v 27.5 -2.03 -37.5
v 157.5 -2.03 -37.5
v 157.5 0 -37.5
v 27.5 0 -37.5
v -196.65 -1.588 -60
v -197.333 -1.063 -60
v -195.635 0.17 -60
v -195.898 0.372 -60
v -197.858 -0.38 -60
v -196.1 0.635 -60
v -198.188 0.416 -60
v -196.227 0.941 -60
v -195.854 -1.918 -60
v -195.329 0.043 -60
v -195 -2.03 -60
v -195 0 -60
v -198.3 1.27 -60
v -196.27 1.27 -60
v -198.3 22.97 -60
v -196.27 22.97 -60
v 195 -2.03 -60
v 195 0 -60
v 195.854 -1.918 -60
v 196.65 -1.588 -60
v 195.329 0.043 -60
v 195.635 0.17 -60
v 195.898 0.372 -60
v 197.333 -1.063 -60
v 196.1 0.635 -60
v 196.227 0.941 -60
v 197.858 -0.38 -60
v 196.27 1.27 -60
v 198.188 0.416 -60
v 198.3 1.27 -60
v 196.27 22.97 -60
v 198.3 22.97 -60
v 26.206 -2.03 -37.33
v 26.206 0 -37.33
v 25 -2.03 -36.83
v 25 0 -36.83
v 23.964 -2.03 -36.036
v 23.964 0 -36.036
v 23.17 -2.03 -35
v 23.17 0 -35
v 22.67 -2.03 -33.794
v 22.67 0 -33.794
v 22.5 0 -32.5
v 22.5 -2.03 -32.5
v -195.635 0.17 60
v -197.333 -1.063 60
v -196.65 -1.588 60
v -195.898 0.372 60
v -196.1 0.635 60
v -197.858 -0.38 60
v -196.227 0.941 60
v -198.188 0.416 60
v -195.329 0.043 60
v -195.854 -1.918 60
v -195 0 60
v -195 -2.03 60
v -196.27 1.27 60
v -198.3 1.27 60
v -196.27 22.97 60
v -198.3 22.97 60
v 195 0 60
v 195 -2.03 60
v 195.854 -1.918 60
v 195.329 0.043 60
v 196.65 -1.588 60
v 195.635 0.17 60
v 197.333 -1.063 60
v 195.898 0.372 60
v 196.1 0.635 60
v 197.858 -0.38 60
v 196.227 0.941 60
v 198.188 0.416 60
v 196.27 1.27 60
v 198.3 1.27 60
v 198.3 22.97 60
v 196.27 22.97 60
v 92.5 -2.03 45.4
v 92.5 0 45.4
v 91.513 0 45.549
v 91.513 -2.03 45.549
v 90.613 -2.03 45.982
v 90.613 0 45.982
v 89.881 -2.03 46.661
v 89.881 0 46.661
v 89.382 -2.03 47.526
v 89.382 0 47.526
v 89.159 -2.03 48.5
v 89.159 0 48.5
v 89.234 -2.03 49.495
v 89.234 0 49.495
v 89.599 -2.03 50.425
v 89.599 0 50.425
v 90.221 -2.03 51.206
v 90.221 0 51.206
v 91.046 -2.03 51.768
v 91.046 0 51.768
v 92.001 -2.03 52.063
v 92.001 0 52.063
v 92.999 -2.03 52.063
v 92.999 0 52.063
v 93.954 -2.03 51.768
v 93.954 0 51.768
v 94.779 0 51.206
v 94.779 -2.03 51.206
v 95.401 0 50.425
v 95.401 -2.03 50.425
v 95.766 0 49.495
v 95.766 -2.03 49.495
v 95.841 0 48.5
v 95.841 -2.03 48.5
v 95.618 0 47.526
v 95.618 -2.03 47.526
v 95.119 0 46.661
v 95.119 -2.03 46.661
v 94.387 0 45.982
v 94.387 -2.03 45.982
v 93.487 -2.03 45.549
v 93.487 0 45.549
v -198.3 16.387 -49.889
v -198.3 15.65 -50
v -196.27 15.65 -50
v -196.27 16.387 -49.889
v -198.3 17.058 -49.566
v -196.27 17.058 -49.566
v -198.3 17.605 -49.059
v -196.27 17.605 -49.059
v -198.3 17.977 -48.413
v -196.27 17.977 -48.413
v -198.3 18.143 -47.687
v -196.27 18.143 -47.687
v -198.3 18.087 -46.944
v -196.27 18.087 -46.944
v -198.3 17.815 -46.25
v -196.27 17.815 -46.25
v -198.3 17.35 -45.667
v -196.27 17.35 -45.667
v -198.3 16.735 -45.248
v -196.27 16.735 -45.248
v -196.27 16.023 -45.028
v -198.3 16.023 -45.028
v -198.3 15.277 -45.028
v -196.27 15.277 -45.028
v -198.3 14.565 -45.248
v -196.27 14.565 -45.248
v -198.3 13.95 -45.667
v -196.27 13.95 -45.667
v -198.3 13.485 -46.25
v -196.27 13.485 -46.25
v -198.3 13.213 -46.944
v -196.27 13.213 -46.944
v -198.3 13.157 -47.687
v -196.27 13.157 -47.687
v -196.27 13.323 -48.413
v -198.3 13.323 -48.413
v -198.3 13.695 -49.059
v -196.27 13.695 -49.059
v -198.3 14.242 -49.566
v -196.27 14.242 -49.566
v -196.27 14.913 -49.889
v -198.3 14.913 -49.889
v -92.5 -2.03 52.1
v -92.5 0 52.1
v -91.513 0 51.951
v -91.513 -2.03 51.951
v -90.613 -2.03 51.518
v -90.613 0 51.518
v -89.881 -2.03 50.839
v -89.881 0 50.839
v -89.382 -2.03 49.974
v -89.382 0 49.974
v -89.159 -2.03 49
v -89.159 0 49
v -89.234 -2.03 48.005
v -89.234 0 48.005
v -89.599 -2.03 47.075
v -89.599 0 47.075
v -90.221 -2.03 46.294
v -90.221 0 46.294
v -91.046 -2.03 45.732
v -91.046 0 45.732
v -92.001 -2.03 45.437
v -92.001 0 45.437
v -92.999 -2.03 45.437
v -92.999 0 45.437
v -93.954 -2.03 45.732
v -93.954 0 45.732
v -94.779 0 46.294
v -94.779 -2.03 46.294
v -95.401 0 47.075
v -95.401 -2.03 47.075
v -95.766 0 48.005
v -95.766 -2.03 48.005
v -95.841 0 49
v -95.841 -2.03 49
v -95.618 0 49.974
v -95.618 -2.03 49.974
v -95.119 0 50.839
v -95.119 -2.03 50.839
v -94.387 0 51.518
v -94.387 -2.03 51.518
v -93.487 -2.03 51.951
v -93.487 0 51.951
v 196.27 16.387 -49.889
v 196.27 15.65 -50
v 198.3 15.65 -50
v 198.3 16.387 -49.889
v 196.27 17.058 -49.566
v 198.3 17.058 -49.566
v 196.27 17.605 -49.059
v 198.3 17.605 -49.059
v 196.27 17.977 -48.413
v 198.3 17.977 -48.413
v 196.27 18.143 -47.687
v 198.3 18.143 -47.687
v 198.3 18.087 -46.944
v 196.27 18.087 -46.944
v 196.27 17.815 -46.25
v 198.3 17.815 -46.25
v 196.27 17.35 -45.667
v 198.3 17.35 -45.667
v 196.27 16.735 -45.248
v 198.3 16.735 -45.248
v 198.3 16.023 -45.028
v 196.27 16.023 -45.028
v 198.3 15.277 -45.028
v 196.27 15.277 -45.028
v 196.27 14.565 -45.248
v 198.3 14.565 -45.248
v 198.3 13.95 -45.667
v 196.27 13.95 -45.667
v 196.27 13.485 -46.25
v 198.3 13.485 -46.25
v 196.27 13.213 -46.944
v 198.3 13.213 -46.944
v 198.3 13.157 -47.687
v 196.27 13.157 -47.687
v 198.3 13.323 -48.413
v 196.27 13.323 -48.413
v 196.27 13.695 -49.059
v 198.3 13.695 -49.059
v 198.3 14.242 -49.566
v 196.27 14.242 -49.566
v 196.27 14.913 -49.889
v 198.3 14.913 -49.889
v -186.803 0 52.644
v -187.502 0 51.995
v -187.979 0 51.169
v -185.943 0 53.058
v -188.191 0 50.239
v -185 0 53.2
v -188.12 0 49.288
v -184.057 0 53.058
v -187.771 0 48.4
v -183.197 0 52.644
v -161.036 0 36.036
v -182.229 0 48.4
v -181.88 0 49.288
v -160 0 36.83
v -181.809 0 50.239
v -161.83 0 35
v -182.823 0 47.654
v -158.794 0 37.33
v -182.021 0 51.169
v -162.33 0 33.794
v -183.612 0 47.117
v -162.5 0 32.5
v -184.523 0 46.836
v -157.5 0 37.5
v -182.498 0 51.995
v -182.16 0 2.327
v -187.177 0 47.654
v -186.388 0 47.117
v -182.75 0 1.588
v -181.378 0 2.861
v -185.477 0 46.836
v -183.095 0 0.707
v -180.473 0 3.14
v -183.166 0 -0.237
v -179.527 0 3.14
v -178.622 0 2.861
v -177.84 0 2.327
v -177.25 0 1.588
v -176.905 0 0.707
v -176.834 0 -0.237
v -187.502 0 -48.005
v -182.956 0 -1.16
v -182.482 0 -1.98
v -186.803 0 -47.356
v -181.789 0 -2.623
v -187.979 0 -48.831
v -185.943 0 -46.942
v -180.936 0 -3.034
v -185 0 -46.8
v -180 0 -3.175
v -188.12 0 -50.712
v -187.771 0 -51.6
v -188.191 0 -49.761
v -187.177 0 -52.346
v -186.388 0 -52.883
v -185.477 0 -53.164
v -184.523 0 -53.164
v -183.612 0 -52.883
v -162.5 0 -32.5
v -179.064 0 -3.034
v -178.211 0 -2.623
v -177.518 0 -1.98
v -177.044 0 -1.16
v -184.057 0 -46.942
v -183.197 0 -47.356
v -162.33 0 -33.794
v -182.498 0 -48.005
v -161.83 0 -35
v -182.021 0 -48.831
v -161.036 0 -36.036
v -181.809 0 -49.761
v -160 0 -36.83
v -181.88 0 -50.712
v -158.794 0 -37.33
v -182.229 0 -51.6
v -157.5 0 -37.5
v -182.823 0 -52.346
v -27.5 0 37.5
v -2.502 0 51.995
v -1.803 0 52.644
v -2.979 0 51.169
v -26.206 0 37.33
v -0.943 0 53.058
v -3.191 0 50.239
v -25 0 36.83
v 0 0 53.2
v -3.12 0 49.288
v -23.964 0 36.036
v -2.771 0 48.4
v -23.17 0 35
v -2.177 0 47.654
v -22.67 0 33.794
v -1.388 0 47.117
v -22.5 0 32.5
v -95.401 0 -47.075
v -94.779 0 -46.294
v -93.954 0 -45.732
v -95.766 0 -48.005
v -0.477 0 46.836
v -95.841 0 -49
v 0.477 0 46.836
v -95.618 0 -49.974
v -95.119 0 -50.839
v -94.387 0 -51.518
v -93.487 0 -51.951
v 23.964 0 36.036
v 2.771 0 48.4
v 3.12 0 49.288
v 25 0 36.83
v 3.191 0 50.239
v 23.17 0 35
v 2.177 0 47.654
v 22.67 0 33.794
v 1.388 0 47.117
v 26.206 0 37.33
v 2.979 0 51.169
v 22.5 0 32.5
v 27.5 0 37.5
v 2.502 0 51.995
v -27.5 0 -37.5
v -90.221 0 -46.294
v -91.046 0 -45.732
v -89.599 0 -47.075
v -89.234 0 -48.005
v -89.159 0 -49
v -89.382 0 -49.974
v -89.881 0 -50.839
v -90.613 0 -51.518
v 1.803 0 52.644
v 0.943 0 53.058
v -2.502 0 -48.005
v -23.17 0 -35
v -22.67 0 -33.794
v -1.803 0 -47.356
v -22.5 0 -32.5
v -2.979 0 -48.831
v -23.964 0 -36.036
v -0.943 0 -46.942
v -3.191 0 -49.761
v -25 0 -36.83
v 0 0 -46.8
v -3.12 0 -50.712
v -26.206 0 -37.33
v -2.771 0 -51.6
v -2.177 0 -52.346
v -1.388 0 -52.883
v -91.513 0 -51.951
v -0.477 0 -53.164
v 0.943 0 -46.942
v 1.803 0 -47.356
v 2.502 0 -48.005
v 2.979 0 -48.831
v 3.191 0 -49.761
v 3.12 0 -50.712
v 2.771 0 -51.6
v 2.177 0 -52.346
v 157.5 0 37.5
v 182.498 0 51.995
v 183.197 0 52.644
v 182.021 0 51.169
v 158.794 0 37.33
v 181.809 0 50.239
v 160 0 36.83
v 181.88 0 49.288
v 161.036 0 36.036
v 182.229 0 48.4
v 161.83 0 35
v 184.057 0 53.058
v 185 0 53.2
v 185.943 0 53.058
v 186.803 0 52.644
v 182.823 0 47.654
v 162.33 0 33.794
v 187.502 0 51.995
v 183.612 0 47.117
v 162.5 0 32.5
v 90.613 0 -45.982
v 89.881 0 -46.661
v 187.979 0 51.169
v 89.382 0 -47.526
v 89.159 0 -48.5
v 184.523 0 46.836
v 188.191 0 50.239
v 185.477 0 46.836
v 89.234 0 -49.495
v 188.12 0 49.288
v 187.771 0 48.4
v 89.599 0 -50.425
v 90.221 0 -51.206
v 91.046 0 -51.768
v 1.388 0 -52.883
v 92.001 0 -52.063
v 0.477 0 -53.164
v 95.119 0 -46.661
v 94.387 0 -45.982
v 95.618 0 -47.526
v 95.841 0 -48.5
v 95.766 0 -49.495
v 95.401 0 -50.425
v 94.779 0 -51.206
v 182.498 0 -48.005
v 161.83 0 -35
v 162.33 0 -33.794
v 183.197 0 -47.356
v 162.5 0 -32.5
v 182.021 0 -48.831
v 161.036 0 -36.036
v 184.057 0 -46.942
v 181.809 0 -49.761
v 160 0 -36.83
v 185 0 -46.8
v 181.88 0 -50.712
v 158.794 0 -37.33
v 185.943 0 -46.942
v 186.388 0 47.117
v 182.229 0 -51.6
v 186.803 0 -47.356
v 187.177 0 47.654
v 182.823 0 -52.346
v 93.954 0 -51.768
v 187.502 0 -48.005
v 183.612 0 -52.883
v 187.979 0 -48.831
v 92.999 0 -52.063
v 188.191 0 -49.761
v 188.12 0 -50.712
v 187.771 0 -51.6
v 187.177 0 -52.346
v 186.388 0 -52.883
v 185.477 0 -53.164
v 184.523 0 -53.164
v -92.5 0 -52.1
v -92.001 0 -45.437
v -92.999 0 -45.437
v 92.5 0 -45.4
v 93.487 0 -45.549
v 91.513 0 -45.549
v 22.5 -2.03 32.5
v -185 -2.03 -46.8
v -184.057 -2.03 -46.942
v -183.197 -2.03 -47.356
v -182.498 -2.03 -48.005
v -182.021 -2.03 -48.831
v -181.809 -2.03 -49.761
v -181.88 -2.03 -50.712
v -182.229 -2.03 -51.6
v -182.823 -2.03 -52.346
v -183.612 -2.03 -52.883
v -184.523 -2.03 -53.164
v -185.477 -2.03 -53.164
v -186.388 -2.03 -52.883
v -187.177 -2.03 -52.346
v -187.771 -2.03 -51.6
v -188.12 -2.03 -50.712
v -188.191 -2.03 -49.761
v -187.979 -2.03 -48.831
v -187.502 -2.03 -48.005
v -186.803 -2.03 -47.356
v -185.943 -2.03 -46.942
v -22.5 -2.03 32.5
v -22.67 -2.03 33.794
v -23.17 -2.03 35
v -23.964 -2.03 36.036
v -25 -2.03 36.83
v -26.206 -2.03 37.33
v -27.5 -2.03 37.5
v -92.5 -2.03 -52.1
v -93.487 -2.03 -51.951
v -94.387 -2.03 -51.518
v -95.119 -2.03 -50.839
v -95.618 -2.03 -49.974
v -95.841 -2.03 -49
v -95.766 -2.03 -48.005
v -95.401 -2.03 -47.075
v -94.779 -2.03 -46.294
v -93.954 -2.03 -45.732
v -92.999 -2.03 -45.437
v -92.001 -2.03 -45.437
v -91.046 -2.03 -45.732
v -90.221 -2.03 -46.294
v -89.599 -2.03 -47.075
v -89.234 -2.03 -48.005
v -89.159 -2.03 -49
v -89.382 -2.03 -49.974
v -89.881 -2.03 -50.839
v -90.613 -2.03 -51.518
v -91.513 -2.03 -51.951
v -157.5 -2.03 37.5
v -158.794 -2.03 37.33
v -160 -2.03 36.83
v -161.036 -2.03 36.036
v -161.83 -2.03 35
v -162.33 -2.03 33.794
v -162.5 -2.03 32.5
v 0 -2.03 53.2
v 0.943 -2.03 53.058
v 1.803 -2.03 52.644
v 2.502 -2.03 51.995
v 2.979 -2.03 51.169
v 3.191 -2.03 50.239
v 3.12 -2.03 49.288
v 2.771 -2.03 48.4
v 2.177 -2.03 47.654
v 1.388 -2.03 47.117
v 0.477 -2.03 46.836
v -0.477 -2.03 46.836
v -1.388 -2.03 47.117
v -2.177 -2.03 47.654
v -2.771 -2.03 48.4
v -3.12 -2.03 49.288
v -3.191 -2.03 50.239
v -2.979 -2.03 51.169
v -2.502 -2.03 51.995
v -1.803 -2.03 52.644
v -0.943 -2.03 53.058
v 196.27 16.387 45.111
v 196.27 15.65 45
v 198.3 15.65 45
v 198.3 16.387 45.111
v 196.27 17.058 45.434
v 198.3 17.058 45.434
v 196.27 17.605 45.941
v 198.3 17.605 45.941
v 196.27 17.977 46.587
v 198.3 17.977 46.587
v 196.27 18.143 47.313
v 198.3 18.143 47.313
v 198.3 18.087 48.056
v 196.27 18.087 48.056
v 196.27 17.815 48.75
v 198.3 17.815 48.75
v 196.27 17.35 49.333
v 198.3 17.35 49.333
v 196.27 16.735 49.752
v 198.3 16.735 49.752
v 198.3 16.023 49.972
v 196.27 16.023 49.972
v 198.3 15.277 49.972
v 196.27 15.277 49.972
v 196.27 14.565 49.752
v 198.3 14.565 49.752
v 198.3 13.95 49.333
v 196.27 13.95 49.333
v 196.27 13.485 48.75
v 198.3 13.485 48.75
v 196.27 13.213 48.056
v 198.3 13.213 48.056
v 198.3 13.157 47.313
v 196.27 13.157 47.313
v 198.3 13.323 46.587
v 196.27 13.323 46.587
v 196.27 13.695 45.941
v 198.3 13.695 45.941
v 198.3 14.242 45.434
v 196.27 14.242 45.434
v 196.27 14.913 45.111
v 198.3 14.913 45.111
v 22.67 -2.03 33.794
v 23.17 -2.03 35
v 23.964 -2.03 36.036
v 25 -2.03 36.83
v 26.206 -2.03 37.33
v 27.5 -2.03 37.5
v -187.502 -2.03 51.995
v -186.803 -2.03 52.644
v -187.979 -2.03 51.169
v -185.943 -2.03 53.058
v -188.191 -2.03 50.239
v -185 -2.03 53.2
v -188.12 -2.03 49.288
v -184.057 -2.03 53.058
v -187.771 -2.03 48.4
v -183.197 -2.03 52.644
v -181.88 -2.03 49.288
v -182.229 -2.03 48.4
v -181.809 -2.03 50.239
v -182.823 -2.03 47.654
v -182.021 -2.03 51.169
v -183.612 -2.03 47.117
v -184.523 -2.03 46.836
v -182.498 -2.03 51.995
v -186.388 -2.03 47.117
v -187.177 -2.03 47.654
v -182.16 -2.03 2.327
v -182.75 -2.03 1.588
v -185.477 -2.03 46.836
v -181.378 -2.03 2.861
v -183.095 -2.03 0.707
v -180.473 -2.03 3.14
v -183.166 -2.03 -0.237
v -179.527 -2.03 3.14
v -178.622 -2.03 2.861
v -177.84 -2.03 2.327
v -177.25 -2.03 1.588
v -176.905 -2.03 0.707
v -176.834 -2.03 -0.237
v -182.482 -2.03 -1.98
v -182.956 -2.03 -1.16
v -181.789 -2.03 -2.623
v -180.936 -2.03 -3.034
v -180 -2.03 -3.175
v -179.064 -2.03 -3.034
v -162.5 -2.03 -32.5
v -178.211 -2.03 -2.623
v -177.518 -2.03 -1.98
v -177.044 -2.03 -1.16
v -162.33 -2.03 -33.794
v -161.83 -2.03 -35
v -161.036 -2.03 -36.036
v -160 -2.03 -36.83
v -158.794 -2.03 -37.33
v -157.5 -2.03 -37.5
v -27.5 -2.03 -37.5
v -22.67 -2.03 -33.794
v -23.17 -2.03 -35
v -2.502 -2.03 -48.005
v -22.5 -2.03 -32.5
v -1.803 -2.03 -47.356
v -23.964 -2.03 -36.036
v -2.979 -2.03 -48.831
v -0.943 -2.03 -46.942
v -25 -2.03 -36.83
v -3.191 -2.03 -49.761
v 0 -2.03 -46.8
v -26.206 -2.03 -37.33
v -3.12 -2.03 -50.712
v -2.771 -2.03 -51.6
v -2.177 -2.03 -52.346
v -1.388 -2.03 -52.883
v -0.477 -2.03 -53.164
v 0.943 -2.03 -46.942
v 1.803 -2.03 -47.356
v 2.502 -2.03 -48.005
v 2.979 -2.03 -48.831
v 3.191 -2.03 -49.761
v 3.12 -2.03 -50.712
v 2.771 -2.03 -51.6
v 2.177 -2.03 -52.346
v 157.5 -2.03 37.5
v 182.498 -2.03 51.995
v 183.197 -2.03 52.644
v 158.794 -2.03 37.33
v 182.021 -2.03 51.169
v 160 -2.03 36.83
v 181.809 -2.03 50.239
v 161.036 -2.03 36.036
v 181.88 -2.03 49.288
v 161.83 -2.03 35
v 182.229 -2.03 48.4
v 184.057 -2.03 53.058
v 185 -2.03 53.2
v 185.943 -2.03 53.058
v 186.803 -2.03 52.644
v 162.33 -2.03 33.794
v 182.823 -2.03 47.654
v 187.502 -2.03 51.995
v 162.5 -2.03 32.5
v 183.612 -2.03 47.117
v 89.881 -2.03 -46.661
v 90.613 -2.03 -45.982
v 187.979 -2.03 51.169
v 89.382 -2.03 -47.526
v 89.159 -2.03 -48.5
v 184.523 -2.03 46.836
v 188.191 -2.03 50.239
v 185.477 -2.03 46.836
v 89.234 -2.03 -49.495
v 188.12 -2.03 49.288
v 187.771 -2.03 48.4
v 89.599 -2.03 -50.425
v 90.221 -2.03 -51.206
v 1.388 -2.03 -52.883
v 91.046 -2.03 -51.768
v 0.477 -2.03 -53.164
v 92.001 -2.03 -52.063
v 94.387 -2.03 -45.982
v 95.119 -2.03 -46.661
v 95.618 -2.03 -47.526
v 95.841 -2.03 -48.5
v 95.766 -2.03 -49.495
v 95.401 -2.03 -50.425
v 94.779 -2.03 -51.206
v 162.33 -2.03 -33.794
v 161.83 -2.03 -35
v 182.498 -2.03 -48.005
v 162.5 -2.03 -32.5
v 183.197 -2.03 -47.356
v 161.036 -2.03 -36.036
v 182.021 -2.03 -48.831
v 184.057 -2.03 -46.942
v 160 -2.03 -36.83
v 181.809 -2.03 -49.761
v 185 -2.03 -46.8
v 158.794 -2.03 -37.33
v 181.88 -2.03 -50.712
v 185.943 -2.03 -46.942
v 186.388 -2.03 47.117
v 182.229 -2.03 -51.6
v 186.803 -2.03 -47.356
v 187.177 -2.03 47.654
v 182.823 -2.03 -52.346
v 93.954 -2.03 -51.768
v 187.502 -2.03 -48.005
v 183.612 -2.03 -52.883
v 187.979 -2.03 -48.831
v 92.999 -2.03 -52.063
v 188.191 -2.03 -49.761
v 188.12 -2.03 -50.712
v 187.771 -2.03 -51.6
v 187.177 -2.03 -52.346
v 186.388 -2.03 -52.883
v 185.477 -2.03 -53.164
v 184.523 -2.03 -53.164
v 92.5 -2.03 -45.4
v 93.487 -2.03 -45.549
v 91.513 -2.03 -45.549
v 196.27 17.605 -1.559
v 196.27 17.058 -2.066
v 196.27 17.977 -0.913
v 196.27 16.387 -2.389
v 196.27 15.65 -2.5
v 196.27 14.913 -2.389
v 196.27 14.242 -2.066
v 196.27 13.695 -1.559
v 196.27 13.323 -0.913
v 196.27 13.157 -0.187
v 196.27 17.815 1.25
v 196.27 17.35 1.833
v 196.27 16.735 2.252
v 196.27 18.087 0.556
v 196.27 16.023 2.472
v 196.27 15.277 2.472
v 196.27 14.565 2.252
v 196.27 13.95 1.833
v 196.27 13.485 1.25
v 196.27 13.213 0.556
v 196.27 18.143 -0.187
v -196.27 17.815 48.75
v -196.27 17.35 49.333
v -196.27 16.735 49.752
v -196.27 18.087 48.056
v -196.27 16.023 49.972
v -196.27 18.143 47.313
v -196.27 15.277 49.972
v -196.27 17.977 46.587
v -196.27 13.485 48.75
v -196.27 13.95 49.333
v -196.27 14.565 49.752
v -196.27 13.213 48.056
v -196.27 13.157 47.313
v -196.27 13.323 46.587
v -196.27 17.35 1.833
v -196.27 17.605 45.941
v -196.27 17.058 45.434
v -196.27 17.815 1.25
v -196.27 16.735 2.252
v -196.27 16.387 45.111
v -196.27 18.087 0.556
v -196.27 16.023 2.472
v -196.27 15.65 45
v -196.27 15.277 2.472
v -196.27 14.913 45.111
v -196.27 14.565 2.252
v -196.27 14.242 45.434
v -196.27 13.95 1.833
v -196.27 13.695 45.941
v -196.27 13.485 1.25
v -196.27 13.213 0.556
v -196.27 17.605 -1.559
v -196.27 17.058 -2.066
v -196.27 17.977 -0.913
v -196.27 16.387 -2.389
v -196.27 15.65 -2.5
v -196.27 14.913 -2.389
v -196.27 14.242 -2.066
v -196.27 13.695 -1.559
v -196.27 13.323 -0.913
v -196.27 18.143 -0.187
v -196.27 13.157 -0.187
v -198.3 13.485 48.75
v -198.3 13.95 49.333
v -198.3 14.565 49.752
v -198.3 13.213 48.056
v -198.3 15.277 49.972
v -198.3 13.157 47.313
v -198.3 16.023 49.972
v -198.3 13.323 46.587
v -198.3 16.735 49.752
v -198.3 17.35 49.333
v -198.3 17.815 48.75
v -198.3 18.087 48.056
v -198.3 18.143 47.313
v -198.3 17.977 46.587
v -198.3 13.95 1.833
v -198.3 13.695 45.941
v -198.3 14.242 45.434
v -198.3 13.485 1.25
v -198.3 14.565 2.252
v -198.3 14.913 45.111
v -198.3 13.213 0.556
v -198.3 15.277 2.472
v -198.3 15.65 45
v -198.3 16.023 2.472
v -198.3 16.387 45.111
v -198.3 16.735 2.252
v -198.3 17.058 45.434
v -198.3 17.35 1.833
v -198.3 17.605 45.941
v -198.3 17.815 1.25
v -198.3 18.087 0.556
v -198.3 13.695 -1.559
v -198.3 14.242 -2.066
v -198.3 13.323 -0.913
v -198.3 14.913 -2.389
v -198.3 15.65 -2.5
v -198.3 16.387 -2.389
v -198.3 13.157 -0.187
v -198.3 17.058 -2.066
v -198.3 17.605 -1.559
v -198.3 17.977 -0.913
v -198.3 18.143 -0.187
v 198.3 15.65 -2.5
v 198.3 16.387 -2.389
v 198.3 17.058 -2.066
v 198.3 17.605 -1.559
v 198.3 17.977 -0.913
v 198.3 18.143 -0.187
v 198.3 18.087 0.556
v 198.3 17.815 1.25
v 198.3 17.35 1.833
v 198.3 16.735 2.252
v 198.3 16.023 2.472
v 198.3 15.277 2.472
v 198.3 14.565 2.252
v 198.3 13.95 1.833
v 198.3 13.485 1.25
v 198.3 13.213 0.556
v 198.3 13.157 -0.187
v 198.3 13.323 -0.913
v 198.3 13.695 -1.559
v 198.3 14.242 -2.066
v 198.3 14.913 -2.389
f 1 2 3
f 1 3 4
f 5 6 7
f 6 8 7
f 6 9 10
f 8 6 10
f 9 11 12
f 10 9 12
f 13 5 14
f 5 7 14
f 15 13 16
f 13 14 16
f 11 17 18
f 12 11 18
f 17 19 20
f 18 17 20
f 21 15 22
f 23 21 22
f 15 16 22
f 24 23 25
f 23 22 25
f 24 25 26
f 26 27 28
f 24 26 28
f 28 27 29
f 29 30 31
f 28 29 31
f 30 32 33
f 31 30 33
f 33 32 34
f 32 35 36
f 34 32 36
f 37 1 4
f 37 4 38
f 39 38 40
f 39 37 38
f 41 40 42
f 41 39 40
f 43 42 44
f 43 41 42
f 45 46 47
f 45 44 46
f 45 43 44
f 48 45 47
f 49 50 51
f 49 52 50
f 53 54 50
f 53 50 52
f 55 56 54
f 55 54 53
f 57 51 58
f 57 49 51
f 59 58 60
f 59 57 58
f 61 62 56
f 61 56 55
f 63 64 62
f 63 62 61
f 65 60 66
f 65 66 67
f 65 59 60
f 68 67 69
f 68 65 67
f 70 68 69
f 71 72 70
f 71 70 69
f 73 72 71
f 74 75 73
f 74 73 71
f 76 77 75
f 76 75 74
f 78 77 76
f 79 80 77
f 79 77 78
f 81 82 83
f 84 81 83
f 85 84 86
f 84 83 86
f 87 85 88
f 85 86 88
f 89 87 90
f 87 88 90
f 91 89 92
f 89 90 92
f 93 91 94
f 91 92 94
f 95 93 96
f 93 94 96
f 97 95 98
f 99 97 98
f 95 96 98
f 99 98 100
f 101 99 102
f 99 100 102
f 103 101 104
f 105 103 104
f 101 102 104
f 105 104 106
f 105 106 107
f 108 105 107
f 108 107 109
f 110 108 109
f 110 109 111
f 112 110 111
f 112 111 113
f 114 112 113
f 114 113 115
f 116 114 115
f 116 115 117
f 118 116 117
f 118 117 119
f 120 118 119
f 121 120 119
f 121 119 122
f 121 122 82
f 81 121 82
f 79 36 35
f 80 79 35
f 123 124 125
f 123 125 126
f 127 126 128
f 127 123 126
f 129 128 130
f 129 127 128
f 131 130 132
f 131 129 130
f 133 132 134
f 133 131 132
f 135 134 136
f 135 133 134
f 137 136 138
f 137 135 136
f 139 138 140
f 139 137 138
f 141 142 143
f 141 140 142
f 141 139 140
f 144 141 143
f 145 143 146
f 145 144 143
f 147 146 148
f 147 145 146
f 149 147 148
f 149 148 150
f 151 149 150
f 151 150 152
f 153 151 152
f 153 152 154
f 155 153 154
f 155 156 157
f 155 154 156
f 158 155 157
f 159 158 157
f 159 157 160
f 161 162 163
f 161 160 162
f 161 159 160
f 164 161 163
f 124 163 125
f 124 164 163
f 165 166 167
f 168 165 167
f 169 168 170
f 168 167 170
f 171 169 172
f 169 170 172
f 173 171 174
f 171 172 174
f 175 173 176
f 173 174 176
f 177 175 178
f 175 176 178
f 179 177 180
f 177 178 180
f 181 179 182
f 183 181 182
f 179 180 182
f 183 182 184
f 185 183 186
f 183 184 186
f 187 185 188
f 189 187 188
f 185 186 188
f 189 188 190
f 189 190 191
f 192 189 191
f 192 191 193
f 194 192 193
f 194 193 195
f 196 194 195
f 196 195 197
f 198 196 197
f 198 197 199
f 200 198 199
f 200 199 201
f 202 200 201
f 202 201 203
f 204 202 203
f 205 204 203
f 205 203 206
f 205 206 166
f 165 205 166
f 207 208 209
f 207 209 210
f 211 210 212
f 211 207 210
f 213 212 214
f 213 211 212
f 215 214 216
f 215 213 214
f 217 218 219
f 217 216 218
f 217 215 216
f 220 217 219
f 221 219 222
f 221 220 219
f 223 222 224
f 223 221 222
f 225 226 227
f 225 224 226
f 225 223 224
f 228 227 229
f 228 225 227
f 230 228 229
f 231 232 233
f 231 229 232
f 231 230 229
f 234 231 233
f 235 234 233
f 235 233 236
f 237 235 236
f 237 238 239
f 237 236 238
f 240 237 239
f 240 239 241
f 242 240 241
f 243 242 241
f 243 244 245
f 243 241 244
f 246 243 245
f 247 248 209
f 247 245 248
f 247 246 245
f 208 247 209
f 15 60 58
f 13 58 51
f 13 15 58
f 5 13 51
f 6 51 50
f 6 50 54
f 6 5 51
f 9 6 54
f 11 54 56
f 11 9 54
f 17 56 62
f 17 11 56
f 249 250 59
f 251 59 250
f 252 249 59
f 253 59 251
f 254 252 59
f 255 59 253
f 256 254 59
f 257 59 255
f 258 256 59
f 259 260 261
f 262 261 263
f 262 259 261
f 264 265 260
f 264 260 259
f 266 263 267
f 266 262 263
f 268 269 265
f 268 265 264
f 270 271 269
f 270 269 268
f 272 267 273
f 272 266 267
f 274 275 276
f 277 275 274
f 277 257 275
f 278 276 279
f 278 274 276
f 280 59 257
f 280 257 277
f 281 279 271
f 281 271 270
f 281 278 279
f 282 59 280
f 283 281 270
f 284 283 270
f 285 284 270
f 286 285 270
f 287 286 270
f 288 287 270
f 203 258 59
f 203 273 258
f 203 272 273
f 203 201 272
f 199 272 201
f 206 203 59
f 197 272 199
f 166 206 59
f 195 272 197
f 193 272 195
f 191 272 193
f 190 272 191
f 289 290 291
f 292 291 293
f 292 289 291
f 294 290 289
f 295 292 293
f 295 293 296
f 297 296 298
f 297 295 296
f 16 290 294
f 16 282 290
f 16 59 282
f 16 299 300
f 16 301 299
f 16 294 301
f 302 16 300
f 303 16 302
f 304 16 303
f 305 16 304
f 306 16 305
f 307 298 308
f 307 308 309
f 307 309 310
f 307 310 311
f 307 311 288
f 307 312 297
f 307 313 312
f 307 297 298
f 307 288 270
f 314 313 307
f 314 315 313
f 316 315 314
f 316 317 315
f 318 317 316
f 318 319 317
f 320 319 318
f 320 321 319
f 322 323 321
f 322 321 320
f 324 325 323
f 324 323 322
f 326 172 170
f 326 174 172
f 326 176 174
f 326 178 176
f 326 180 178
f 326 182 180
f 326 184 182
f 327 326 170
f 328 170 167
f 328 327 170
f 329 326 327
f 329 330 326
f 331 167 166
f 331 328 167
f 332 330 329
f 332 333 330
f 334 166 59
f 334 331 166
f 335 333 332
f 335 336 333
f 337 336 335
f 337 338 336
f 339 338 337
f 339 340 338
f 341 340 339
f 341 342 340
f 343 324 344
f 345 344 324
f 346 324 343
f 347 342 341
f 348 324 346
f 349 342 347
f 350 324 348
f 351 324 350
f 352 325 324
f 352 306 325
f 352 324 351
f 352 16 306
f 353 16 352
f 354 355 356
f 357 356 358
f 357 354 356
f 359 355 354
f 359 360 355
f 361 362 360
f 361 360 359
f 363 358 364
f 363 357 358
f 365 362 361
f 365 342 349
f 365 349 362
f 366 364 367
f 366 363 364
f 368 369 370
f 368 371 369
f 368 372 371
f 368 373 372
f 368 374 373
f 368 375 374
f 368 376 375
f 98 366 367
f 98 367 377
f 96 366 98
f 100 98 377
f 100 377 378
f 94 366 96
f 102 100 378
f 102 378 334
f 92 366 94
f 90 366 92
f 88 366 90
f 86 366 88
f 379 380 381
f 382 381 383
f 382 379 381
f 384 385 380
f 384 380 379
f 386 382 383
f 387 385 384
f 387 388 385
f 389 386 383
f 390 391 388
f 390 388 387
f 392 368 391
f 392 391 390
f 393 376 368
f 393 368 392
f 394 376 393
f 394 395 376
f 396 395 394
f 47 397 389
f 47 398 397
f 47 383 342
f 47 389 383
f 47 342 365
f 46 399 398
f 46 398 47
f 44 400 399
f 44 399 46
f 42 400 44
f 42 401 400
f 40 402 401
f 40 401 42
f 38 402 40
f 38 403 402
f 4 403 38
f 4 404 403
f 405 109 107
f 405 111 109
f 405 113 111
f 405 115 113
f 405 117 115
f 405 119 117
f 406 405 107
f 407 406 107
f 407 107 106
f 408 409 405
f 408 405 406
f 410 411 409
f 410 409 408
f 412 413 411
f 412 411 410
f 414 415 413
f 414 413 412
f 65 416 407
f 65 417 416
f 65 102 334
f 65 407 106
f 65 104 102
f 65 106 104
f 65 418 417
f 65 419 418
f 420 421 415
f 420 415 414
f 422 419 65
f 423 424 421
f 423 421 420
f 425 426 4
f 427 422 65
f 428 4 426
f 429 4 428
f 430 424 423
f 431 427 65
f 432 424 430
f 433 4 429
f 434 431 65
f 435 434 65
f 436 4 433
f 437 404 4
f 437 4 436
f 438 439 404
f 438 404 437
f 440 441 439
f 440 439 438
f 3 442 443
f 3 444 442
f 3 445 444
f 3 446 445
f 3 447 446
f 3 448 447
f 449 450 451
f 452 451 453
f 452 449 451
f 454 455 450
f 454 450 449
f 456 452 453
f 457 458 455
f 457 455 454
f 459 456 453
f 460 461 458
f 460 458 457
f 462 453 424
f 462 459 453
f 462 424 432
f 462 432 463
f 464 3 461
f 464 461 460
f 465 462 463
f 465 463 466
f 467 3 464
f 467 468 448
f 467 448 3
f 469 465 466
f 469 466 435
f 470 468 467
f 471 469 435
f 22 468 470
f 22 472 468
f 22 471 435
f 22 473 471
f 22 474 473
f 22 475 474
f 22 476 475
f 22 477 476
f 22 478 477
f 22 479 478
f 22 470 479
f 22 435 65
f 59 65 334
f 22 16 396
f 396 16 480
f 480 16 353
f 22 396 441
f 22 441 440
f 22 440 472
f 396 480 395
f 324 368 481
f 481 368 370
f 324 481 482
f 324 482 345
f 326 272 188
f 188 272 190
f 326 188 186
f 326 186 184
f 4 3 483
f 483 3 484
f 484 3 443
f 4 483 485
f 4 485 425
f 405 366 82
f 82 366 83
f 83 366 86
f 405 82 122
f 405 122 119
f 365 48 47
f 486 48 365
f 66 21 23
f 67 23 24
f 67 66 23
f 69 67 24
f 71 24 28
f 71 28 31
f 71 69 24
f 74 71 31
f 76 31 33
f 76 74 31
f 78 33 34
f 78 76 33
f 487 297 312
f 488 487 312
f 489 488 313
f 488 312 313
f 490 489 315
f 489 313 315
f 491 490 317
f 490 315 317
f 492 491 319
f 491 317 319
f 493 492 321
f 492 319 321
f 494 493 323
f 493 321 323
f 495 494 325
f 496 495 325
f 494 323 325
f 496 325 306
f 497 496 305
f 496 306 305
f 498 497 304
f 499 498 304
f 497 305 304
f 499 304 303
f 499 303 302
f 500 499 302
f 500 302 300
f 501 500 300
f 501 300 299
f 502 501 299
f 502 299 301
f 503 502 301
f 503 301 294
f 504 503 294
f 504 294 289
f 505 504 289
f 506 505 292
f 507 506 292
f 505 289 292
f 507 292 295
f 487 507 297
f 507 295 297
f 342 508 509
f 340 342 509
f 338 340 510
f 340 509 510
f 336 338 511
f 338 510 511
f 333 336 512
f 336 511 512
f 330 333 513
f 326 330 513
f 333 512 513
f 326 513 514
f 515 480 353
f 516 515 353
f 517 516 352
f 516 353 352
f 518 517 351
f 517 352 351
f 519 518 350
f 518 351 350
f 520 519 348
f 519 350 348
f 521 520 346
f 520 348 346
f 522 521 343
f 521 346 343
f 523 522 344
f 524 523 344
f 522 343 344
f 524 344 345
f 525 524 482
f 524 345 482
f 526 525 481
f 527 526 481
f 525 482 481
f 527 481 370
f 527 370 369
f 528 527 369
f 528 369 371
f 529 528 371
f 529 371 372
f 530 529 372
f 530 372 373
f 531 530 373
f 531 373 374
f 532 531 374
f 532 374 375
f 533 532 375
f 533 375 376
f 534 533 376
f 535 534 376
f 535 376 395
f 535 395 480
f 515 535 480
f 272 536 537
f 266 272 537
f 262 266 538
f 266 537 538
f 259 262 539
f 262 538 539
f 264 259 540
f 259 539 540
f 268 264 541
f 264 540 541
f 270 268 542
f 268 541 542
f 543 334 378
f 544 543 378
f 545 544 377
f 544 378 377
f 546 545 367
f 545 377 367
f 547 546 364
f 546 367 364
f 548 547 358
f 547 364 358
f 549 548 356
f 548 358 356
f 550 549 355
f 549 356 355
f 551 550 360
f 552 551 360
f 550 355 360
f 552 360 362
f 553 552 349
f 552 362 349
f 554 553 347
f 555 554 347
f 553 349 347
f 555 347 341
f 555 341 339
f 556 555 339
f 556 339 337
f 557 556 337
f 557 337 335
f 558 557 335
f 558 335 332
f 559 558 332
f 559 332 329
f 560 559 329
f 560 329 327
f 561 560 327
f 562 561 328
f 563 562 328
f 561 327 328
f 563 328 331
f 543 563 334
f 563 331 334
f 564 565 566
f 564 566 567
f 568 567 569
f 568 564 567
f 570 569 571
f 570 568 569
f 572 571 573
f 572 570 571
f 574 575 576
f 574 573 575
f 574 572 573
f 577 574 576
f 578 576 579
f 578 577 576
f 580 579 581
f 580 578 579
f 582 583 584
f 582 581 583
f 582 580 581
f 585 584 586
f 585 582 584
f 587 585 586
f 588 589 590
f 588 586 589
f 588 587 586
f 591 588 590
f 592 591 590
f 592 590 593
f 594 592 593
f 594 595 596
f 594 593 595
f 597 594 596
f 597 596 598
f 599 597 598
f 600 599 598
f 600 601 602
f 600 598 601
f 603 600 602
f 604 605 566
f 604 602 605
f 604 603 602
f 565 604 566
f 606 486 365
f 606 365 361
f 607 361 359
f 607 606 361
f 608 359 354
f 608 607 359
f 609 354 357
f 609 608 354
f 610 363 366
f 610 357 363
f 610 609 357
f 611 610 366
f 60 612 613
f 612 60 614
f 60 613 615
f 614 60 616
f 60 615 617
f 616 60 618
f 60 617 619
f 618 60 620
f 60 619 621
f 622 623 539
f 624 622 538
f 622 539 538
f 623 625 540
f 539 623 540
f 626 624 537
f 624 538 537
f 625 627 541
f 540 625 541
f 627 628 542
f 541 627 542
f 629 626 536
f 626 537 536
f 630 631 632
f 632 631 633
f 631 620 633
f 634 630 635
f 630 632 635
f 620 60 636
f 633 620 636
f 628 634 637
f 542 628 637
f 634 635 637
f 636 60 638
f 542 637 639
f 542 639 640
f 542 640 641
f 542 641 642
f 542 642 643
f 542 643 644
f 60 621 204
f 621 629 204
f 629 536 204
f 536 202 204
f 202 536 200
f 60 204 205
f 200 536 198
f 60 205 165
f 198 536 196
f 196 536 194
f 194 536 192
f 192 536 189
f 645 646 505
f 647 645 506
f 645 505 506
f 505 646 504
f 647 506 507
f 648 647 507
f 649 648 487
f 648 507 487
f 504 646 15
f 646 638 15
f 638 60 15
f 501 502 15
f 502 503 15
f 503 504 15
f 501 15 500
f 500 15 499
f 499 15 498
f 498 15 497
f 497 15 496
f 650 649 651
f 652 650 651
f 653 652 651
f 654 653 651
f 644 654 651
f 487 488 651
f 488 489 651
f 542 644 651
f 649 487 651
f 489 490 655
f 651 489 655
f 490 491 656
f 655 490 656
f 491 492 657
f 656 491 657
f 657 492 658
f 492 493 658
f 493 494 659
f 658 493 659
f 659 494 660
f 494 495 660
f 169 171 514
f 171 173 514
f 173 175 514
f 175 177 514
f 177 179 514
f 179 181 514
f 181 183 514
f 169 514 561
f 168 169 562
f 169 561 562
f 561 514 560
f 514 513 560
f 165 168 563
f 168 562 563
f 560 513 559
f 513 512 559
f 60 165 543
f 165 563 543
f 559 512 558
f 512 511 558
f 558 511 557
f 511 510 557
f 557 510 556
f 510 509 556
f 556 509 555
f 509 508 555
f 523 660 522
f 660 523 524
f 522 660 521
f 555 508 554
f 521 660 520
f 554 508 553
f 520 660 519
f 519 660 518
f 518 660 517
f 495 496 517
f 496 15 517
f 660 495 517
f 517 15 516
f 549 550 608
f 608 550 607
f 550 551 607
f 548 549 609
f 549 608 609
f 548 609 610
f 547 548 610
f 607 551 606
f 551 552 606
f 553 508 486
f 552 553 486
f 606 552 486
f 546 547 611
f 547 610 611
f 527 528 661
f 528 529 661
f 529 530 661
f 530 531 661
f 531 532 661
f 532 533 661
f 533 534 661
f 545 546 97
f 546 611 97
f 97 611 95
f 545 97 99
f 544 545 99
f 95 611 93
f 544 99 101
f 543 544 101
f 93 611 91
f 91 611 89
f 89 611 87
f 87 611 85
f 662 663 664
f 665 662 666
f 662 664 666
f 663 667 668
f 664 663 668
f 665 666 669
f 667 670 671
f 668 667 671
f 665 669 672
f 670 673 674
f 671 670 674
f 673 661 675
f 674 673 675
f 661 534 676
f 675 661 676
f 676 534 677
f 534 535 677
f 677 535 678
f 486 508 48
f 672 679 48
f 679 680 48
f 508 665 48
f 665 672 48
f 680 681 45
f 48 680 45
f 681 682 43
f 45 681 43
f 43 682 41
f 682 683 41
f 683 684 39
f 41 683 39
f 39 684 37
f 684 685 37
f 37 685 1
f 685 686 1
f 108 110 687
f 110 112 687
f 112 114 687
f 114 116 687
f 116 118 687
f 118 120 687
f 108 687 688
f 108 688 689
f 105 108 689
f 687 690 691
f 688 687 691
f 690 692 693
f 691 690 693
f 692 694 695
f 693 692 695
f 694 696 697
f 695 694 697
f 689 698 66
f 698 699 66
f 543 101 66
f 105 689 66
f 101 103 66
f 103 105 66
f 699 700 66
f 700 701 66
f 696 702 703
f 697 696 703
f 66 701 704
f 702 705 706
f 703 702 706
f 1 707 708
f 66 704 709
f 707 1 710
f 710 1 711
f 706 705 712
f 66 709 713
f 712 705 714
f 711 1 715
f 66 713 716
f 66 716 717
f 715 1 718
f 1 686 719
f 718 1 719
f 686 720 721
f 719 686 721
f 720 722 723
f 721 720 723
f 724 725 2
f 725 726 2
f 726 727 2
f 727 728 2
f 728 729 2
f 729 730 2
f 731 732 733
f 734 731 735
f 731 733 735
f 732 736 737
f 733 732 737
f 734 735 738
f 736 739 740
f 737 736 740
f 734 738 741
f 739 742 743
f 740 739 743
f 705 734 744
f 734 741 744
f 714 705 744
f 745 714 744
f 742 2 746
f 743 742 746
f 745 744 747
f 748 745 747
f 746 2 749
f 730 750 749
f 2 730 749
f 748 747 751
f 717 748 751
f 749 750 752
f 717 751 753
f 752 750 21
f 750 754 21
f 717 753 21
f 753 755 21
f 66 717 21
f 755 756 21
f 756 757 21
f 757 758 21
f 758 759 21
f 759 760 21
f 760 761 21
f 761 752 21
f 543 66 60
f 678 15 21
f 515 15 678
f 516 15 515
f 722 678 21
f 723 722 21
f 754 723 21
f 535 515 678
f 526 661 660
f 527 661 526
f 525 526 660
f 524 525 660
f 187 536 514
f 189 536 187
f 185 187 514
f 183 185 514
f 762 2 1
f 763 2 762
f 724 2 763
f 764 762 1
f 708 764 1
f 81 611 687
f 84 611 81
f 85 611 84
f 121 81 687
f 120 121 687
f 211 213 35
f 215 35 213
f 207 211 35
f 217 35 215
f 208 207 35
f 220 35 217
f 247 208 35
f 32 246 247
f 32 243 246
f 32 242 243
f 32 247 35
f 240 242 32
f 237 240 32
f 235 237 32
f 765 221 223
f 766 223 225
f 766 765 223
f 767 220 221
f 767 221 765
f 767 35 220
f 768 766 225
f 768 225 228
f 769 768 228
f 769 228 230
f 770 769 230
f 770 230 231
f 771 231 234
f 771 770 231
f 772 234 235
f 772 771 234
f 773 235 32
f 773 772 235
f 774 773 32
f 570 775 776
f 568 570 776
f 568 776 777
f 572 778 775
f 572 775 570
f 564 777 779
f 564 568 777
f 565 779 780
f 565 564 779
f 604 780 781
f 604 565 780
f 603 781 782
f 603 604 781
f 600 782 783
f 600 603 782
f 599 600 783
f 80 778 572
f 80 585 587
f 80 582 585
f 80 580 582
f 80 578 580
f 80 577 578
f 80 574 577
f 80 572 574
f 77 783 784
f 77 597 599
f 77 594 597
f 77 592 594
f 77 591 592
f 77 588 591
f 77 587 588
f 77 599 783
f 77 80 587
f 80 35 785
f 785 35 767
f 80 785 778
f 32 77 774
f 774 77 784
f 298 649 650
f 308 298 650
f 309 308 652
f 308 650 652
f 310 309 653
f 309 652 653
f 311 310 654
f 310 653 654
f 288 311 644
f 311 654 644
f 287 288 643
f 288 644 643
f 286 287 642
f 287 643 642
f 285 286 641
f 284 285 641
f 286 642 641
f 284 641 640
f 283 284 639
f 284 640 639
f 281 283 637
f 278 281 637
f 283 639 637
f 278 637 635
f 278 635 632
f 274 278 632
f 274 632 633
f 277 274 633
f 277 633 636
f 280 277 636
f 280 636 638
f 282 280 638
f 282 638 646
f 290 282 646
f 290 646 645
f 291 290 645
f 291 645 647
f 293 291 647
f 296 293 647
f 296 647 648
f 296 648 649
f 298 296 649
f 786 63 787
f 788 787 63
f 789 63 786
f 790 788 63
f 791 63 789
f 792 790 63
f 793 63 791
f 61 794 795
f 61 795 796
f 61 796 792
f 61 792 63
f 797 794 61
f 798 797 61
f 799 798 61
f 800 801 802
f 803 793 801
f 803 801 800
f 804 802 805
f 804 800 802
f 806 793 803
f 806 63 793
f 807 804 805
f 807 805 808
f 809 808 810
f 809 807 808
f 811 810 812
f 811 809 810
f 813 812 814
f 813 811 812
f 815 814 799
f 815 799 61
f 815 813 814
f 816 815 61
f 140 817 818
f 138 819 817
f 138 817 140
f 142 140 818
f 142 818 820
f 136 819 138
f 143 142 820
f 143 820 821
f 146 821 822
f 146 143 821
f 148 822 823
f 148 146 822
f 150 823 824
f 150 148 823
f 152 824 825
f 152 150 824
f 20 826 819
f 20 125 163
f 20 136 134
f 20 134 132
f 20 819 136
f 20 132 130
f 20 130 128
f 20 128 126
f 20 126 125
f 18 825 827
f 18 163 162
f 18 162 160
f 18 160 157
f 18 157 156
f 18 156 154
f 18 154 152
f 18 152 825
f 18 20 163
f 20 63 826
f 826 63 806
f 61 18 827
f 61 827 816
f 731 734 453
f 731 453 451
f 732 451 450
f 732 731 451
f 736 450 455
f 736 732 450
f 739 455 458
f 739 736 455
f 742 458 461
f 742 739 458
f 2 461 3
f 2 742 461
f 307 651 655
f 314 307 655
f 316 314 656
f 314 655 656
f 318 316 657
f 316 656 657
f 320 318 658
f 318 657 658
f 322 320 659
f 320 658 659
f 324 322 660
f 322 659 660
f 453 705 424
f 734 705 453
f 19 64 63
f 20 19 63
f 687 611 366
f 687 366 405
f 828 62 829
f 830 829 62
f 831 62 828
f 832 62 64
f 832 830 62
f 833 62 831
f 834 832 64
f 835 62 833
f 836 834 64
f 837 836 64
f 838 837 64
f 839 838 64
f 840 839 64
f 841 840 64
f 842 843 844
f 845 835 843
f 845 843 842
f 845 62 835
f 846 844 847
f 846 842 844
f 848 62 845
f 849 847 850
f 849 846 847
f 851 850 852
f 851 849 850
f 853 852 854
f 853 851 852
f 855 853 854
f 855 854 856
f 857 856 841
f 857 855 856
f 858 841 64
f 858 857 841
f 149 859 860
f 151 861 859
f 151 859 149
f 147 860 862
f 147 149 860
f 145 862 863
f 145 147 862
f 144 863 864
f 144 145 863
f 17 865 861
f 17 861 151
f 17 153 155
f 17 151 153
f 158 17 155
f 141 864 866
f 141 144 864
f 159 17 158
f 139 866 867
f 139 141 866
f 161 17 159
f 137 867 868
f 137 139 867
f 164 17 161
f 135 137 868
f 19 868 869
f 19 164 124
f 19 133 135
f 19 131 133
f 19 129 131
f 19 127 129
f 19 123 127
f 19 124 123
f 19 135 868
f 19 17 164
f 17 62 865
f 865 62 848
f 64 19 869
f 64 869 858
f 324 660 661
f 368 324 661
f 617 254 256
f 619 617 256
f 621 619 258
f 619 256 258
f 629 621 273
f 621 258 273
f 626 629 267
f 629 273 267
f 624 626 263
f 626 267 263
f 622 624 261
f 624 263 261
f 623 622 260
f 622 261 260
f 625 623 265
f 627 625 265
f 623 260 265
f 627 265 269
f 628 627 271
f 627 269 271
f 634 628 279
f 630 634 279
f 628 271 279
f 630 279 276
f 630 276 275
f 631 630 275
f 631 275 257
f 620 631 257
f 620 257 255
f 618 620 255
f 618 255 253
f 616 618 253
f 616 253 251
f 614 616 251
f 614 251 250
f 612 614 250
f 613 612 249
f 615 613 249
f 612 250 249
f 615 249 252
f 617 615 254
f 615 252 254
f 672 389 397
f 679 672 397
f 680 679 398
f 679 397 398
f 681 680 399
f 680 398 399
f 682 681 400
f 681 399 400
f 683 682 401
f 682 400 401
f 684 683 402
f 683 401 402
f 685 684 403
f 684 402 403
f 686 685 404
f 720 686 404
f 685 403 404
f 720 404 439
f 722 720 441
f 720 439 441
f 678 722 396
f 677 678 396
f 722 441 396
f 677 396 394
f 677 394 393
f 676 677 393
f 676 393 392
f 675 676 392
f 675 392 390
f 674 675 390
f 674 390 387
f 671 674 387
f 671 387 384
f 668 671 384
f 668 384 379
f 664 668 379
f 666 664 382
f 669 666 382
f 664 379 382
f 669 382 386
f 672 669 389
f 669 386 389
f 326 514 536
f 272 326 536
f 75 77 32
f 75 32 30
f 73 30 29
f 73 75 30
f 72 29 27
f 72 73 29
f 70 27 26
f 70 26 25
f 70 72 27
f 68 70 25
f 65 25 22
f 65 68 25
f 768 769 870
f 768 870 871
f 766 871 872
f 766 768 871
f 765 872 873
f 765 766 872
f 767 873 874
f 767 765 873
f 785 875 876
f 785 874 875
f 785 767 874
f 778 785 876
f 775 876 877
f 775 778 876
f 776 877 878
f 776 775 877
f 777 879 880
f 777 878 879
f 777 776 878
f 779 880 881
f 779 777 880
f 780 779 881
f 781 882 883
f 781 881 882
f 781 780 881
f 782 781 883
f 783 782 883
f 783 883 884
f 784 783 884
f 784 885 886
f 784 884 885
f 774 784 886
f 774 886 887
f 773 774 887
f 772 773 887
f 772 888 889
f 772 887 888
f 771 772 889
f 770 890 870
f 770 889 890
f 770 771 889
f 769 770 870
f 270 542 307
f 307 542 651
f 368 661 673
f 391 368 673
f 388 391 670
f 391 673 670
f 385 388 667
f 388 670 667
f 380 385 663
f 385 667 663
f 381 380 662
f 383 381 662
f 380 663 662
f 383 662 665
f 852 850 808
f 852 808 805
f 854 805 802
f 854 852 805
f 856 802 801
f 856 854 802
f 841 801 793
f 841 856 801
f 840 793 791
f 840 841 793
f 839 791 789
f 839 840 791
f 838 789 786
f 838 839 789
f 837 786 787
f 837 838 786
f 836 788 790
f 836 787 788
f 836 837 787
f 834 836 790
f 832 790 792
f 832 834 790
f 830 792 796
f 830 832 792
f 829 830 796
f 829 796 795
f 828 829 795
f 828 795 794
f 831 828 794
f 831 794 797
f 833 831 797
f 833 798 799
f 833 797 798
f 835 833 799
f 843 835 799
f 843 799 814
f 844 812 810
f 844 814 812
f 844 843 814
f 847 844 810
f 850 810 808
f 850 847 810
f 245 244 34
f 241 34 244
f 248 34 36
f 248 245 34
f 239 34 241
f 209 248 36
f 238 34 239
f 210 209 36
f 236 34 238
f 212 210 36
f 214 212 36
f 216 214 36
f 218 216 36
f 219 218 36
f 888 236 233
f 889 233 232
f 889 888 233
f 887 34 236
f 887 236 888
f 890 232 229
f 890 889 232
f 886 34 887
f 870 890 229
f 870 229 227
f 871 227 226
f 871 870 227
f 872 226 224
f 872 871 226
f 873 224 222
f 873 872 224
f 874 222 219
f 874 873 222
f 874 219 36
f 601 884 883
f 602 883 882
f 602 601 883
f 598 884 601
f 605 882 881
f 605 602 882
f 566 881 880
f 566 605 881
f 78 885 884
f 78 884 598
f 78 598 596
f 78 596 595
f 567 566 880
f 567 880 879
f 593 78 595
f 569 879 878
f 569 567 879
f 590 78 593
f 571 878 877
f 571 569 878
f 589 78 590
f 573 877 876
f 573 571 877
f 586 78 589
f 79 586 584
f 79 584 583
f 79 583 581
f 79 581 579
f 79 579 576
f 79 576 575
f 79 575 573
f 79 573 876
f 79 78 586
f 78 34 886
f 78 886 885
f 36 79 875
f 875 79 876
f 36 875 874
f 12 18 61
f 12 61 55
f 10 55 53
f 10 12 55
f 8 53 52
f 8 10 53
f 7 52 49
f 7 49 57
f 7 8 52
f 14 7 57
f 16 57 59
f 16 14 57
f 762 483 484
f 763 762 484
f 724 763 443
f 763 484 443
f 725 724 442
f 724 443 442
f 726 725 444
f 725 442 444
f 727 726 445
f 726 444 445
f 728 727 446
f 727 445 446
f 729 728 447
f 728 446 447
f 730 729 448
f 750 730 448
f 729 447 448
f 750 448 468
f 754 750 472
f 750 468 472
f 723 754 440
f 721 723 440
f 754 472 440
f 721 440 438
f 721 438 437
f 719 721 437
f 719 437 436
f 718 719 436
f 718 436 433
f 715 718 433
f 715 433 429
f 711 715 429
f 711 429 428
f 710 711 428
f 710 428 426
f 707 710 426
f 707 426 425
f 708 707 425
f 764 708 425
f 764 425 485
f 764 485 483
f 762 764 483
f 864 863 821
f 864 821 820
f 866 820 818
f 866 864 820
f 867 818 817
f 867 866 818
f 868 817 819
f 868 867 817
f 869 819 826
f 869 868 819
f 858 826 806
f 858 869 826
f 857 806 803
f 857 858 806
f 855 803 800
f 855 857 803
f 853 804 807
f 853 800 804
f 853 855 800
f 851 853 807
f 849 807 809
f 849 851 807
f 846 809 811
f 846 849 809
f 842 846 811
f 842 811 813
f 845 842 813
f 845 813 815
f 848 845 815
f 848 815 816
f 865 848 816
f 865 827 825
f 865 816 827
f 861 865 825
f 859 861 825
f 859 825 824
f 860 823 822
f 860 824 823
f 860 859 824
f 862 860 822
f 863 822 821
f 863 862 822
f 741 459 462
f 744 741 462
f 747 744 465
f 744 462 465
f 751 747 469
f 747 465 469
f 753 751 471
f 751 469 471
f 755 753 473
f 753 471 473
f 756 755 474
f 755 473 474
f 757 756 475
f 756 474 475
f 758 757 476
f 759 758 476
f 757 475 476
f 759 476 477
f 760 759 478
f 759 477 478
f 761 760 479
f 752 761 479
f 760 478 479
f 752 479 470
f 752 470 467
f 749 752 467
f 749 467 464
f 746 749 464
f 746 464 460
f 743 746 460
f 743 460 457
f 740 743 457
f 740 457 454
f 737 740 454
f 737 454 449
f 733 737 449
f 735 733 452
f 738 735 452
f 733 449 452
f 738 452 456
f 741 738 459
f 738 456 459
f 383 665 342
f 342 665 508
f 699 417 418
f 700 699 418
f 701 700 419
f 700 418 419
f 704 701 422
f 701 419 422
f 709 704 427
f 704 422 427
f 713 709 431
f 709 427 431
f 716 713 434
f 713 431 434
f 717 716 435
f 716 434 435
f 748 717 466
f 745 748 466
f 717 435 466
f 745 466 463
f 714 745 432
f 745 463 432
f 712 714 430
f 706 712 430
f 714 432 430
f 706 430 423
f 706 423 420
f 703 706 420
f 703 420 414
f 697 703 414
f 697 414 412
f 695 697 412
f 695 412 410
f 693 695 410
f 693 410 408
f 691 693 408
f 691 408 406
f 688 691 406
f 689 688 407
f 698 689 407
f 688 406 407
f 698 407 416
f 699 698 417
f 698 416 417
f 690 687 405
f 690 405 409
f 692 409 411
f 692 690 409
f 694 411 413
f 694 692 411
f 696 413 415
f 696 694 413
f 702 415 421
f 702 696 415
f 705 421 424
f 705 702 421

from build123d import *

# Parameters (mm, degrees)
SKETCH1_W               = 390
SKETCH1_H               = 120
SKETCH1_R               = 3.2
BOSS_EXTRUDE1_DEPTH     = 2.03
EDGE_FLANGE1_DEPTH      = 120
EDGE_FLANGE1_BEND_DEPTH = 120
CUT_EXTRUDE1_REACH      = 210.681
CUT_EXTRUDE2_DEPTH      = 209.447861347
CUT_EXTRUDE2_DEPTH_BACK = 209.447861347
SKETCH19_R              = 2.5
SKETCH20_R              = 3.35
CUT_EXTRUDE3_DEPTH      = 209.447861347
SKETCH21_R              = 3.175
CUT_EXTRUDE4_DEPTH      = 209.681312053


# Sheet-metal steps are written as plain solids
with BuildPart() as part:
    # Sketch1 → Boss-Extrude1 (new body)
    with BuildSketch(Plane(origin=(0, 0, 0), x_dir=(1, 0, 0), z_dir=(0, 1, 0))):
        Rectangle(SKETCH1_W, SKETCH1_H)
        with Locations(Location((0, 50, 0), (0, 0, 270))):
            Circle(SKETCH1_R, mode=Mode.SUBTRACT)
        with Locations(Location((-185, 50, 0), (0, 0, 270))):
            Circle(SKETCH1_R, mode=Mode.SUBTRACT)
        with Locations(Location((-185, -50, 0), (0, 0, 270))):
            Circle(SKETCH1_R, mode=Mode.SUBTRACT)
        with Locations(Location((0, -50, 0), (0, 0, 270))):
            Circle(SKETCH1_R, mode=Mode.SUBTRACT)
        with Locations(Location((185, -50, 0), (0, 0, 270))):
            Circle(SKETCH1_R, mode=Mode.SUBTRACT)
        with Locations(Location((185, 50, 0), (0, 0, 270))):
            Circle(SKETCH1_R, mode=Mode.SUBTRACT)
    extrude(amount=-BOSS_EXTRUDE1_DEPTH)

    # Edge-Flange1 section (across the edge) → Edge-Flange1 (add)
    with BuildSketch(Plane(origin=(-196.27, 0, -60), x_dir=(1, 0, 0), z_dir=(0, 0, 1))):
        with BuildLine():
            Line((-2.03, 1.27), (-2.03, 22.97))
            Line((-2.03, 22.97), (0, 22.97))
            Line((0, 22.97), (0, 1.27))
            ThreePointArc((0, 1.27), (0.371974388, 0.371974388), (1.27, 0))
            Line((1.27, 0), (1.27, -2.03))
            ThreePointArc((1.27, -2.03), (-1.063452378, -1.063452378), (-2.03, 1.27))
        make_face()
    extrude(amount=EDGE_FLANGE1_DEPTH)

    # Edge-Flange1 section 2 (across the edge) → Edge-Flange1 bend (add)
    with BuildSketch(Plane(origin=(196.27, 0, 60), x_dir=(-1, 0, 0), z_dir=(0, 0, -1))):
        with BuildLine():
            Line((-2.03, 1.27), (-2.03, 22.97))
            Line((-2.03, 22.97), (0, 22.97))
            Line((0, 22.97), (0, 1.27))
            ThreePointArc((0, 1.27), (0.371974388, 0.371974388), (1.27, 0))
            Line((1.27, 0), (1.27, -2.03))
            ThreePointArc((1.27, -2.03), (-1.063452378, -1.063452378), (-2.03, 1.27))
        make_face()
    extrude(amount=EDGE_FLANGE1_BEND_DEPTH)

    # Sketch18 → Cut-Extrude1 (cut, up to next)
    with BuildSketch(Plane.XZ.offset(2.03), mode=Mode.PRIVATE) as cut_extrude1_sk1:
        with BuildLine():
            Line((-157.5, -37.5), (-27.5, -37.5))
            ThreePointArc((-27.5, -37.5), (-23.964466094, -36.035533906), (-22.5, -32.5))
            Line((-22.5, -32.5), (-22.5, 32.5))
            ThreePointArc((-22.5, 32.5), (-23.964466094, 36.035533906), (-27.5, 37.5))
            Line((-27.5, 37.5), (-157.5, 37.5))
            ThreePointArc((-157.5, 37.5), (-161.035533906, 36.035533906), (-162.5, 32.5))
            Line((-162.5, 32.5), (-162.5, -32.5))
            ThreePointArc((-162.5, -32.5), (-161.035533906, -36.035533906), (-157.5, -37.5))
        make_face()
    cut_extrude1_tool1 = extrude(cut_extrude1_sk1.sketch, amount=-CUT_EXTRUDE1_REACH, mode=Mode.PRIVATE) & part.part
    # Sketch18 → Cut-Extrude1 (cut, up to next)
    with BuildSketch(Plane.XZ.offset(2.03), mode=Mode.PRIVATE) as cut_extrude1_sk2:
        with BuildLine():
            Line((22.5, -32.5), (22.5, 32.5))
            ThreePointArc((22.5, 32.5), (23.964466094, 36.035533906), (27.5, 37.5))
            Line((27.5, 37.5), (157.5, 37.5))
            ThreePointArc((157.5, 37.5), (161.035533906, 36.035533906), (162.5, 32.5))
            Line((162.5, 32.5), (162.5, -32.5))
            ThreePointArc((162.5, -32.5), (161.035533906, -36.035533906), (157.5, -37.5))
            Line((157.5, -37.5), (27.5, -37.5))
            ThreePointArc((27.5, -37.5), (23.964466094, -36.035533906), (22.5, -32.5))
        make_face()
    cut_extrude1_tool2 = extrude(cut_extrude1_sk2.sketch, amount=-CUT_EXTRUDE1_REACH, mode=Mode.PRIVATE) & part.part
    add(cut_extrude1_tool1.solids().sort_by_distance((-92.5, -2.03, 0))[0], mode=Mode.SUBTRACT)
    add(cut_extrude1_tool2.solids().sort_by_distance((92.5, -2.03, 0))[0], mode=Mode.SUBTRACT)

    # Sketch19 → Cut-Extrude2 (cut, two sides: drawn at the far end of the back side and taken through both)
    with BuildSketch(Plane(origin=(0, 0, 0), x_dir=(0, 0, -1), z_dir=(1, 0, 0)).offset(-CUT_EXTRUDE2_DEPTH_BACK)):
        with Locations((-47.5, 15.65)):
            Circle(SKETCH19_R)
        with Locations((0, 15.65)):
            Circle(SKETCH19_R)
        with Locations((47.5, 15.65)):
            Circle(SKETCH19_R)
    extrude(amount=CUT_EXTRUDE2_DEPTH + CUT_EXTRUDE2_DEPTH_BACK, mode=Mode.SUBTRACT)

    # Sketch20 → Cut-Extrude3 (cut, through all)
    with BuildSketch(Plane(origin=(0, 0, 0), x_dir=(1, 0, 0), z_dir=(0, 1, 0))):
        with Locations(Location((-92.5, -48.75, 0), (0, 0, 270))):
            Circle(SKETCH20_R)
        with Locations(Location((92.5, -48.75, 0), (0, 0, 90))):
            Circle(SKETCH20_R)
        with Locations(Location((92.5, 48.75, 0), (0, 0, 270))):
            Circle(SKETCH20_R)
        with Locations(Location((-92.5, 48.75, 0), (0, 0, 90))):
            Circle(SKETCH20_R)
    extrude(amount=-CUT_EXTRUDE3_DEPTH, mode=Mode.SUBTRACT)

    # Sketch21 → Cut-Extrude4 (cut, through all)
    with BuildSketch(Plane.XZ.offset(2.03)):
        with Locations(Location((-180, 0, 0), (0, 0, 270))):
            Circle(SKETCH21_R)
    extrude(amount=-CUT_EXTRUDE4_DEPTH, mode=Mode.SUBTRACT)


solid = part.part
